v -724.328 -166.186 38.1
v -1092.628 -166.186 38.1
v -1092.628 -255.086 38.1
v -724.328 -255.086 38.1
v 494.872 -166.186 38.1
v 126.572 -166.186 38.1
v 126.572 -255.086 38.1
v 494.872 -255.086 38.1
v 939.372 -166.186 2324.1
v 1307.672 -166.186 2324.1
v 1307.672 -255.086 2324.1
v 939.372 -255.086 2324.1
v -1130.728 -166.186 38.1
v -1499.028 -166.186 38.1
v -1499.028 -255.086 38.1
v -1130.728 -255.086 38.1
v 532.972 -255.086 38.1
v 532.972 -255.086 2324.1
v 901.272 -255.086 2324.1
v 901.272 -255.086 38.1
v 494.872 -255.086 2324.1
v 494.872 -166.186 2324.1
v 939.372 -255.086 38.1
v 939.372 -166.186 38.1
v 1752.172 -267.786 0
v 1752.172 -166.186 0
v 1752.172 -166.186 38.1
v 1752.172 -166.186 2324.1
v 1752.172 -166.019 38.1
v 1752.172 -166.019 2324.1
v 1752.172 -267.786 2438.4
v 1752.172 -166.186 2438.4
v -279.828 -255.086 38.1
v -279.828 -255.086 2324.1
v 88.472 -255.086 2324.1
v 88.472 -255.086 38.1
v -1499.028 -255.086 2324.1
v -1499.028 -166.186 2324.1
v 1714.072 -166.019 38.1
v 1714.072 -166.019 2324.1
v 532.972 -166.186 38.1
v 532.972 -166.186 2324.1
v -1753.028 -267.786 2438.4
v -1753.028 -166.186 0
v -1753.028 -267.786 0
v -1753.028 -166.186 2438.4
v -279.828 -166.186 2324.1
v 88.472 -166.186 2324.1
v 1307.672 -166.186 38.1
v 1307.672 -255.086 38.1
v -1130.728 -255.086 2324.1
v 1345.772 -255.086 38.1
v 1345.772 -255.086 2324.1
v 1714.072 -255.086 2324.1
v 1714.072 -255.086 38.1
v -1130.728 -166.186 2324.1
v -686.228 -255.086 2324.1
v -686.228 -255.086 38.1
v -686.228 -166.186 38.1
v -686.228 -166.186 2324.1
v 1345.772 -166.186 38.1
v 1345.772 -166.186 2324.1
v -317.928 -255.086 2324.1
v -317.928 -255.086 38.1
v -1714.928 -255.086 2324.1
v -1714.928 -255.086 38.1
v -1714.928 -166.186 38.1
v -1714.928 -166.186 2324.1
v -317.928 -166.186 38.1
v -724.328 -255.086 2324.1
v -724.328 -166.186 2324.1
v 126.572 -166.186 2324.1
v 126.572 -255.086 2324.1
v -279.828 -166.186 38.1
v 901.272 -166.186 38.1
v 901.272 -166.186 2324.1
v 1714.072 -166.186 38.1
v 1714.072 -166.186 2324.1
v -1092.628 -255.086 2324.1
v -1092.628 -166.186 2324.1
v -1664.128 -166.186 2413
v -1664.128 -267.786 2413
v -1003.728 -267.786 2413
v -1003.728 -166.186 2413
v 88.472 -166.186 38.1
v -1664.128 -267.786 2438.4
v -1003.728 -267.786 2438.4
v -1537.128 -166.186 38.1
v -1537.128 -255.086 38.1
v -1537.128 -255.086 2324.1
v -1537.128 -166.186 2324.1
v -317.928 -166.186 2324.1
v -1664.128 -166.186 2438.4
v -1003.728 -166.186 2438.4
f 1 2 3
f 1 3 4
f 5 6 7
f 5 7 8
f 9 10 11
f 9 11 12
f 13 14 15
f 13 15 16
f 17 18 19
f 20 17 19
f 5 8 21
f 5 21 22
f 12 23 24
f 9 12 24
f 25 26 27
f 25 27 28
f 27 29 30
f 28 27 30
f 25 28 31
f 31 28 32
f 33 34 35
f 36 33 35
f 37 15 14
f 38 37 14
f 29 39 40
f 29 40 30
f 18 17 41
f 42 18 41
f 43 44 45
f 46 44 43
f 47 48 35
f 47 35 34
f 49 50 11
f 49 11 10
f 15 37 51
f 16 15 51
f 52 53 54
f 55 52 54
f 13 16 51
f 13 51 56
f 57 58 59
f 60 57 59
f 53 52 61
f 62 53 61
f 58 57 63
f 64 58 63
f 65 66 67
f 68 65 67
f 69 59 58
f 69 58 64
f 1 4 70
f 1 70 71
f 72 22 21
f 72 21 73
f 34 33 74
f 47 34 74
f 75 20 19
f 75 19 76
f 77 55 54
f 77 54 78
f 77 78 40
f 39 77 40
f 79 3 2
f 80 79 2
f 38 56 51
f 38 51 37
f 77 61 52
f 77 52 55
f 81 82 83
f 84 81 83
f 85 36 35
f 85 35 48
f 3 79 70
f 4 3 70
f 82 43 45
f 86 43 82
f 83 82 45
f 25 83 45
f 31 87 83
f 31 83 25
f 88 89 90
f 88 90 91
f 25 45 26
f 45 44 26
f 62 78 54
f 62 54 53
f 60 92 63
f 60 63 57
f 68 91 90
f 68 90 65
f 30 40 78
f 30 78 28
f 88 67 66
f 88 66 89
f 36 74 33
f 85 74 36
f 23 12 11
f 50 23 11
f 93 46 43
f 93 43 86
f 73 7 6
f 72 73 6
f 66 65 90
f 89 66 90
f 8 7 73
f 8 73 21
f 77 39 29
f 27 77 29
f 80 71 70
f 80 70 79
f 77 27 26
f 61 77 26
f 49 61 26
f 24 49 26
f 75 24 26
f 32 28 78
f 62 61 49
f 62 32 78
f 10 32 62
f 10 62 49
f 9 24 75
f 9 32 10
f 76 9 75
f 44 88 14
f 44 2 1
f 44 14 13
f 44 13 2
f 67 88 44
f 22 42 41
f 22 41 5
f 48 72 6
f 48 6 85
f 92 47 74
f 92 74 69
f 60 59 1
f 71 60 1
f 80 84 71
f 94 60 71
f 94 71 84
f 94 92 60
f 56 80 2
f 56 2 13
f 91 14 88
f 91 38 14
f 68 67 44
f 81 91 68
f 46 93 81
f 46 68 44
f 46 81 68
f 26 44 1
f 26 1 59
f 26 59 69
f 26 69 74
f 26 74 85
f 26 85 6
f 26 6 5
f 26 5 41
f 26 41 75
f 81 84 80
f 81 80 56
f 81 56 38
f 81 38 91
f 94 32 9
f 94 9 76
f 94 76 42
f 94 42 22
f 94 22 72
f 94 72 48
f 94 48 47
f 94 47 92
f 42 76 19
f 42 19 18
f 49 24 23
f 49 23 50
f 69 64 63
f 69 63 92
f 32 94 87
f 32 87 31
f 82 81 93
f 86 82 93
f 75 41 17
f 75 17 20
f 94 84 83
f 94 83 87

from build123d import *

# Parameters (mm, degrees)
F0_W     = 3505.2
F0_H     = 88.9
F1_DEPTH = 38.1
F2_W     = 38.1
F2_H     = 89.067161
F2_H_2   = 88.9
F3_DEPTH = 2286
F4_W     = 3505.2
F4_H     = 114.3
F5_DEPTH = 88.9
F6_W     = 3505.2
F6_H     = 2438.4
F7_DEPTH = 12.7
F8_W     = 660.4
F8_H     = 25.4
F9_DEPTH = 132.08


with BuildPart() as f1:
    # F0 (on Top) → F1 (new body)
    with BuildSketch(Plane.XY):
        with Locations((-0.428095, -210.635948)):
            Rectangle(F0_W, F0_H)
    extrude(amount=F1_DEPTH)

    # F2 (on face) → F3 (join)
    with BuildSketch(Plane.XY.offset(38.1)):
        with Locations((1733.121905, -210.552368)):
            Rectangle(F2_W, F2_H)
        with Locations((1326.721905, -210.635948)):
            Rectangle(F2_W, F2_H_2)
        with Locations((920.321905, -210.635948)):
            Rectangle(F2_W, F2_H_2)
        with Locations((513.921905, -210.635948)):
            Rectangle(F2_W, F2_H_2)
        with Locations((107.521905, -210.635948)):
            Rectangle(F2_W, F2_H_2)
        with Locations((-298.878095, -210.635948)):
            Rectangle(F2_W, F2_H_2)
        with Locations((-705.278095, -210.635948)):
            Rectangle(F2_W, F2_H_2)
        with Locations((-1111.678095, -210.635948)):
            Rectangle(F2_W, F2_H_2)
        with Locations((-1518.078095, -210.635948)):
            Rectangle(F2_W, F2_H_2)
        with Locations((-1733.978095, -210.635948)):
            Rectangle(F2_W, F2_H_2)
    extrude(amount=F3_DEPTH)

    # F4 (on face) → F5 (join)
    with BuildSketch(Plane(origin=(0, -166.185948, 0), x_dir=(-1, 0, 0), z_dir=(0, 1, 0))):
        with Locations((0.428095, 2381.25)):
            Rectangle(F4_W, F4_H)
    extrude(amount=-F5_DEPTH)

    # F6 (on face) → F7 (join)
    with BuildSketch(Plane.XZ.offset(255.085948)):
        with Locations((-0.428095, 1219.2)):
            Rectangle(F6_W, F6_H)
    extrude(amount=F7_DEPTH)

    # F8 (on face) → F9 (cut)
    with BuildSketch(Plane.XZ.offset(267.785948)):
        with Locations((-1333.928095, 2425.7)):
            Rectangle(F8_W, F8_H)
    extrude(amount=-F9_DEPTH, mode=Mode.SUBTRACT)


solid = f1.part
